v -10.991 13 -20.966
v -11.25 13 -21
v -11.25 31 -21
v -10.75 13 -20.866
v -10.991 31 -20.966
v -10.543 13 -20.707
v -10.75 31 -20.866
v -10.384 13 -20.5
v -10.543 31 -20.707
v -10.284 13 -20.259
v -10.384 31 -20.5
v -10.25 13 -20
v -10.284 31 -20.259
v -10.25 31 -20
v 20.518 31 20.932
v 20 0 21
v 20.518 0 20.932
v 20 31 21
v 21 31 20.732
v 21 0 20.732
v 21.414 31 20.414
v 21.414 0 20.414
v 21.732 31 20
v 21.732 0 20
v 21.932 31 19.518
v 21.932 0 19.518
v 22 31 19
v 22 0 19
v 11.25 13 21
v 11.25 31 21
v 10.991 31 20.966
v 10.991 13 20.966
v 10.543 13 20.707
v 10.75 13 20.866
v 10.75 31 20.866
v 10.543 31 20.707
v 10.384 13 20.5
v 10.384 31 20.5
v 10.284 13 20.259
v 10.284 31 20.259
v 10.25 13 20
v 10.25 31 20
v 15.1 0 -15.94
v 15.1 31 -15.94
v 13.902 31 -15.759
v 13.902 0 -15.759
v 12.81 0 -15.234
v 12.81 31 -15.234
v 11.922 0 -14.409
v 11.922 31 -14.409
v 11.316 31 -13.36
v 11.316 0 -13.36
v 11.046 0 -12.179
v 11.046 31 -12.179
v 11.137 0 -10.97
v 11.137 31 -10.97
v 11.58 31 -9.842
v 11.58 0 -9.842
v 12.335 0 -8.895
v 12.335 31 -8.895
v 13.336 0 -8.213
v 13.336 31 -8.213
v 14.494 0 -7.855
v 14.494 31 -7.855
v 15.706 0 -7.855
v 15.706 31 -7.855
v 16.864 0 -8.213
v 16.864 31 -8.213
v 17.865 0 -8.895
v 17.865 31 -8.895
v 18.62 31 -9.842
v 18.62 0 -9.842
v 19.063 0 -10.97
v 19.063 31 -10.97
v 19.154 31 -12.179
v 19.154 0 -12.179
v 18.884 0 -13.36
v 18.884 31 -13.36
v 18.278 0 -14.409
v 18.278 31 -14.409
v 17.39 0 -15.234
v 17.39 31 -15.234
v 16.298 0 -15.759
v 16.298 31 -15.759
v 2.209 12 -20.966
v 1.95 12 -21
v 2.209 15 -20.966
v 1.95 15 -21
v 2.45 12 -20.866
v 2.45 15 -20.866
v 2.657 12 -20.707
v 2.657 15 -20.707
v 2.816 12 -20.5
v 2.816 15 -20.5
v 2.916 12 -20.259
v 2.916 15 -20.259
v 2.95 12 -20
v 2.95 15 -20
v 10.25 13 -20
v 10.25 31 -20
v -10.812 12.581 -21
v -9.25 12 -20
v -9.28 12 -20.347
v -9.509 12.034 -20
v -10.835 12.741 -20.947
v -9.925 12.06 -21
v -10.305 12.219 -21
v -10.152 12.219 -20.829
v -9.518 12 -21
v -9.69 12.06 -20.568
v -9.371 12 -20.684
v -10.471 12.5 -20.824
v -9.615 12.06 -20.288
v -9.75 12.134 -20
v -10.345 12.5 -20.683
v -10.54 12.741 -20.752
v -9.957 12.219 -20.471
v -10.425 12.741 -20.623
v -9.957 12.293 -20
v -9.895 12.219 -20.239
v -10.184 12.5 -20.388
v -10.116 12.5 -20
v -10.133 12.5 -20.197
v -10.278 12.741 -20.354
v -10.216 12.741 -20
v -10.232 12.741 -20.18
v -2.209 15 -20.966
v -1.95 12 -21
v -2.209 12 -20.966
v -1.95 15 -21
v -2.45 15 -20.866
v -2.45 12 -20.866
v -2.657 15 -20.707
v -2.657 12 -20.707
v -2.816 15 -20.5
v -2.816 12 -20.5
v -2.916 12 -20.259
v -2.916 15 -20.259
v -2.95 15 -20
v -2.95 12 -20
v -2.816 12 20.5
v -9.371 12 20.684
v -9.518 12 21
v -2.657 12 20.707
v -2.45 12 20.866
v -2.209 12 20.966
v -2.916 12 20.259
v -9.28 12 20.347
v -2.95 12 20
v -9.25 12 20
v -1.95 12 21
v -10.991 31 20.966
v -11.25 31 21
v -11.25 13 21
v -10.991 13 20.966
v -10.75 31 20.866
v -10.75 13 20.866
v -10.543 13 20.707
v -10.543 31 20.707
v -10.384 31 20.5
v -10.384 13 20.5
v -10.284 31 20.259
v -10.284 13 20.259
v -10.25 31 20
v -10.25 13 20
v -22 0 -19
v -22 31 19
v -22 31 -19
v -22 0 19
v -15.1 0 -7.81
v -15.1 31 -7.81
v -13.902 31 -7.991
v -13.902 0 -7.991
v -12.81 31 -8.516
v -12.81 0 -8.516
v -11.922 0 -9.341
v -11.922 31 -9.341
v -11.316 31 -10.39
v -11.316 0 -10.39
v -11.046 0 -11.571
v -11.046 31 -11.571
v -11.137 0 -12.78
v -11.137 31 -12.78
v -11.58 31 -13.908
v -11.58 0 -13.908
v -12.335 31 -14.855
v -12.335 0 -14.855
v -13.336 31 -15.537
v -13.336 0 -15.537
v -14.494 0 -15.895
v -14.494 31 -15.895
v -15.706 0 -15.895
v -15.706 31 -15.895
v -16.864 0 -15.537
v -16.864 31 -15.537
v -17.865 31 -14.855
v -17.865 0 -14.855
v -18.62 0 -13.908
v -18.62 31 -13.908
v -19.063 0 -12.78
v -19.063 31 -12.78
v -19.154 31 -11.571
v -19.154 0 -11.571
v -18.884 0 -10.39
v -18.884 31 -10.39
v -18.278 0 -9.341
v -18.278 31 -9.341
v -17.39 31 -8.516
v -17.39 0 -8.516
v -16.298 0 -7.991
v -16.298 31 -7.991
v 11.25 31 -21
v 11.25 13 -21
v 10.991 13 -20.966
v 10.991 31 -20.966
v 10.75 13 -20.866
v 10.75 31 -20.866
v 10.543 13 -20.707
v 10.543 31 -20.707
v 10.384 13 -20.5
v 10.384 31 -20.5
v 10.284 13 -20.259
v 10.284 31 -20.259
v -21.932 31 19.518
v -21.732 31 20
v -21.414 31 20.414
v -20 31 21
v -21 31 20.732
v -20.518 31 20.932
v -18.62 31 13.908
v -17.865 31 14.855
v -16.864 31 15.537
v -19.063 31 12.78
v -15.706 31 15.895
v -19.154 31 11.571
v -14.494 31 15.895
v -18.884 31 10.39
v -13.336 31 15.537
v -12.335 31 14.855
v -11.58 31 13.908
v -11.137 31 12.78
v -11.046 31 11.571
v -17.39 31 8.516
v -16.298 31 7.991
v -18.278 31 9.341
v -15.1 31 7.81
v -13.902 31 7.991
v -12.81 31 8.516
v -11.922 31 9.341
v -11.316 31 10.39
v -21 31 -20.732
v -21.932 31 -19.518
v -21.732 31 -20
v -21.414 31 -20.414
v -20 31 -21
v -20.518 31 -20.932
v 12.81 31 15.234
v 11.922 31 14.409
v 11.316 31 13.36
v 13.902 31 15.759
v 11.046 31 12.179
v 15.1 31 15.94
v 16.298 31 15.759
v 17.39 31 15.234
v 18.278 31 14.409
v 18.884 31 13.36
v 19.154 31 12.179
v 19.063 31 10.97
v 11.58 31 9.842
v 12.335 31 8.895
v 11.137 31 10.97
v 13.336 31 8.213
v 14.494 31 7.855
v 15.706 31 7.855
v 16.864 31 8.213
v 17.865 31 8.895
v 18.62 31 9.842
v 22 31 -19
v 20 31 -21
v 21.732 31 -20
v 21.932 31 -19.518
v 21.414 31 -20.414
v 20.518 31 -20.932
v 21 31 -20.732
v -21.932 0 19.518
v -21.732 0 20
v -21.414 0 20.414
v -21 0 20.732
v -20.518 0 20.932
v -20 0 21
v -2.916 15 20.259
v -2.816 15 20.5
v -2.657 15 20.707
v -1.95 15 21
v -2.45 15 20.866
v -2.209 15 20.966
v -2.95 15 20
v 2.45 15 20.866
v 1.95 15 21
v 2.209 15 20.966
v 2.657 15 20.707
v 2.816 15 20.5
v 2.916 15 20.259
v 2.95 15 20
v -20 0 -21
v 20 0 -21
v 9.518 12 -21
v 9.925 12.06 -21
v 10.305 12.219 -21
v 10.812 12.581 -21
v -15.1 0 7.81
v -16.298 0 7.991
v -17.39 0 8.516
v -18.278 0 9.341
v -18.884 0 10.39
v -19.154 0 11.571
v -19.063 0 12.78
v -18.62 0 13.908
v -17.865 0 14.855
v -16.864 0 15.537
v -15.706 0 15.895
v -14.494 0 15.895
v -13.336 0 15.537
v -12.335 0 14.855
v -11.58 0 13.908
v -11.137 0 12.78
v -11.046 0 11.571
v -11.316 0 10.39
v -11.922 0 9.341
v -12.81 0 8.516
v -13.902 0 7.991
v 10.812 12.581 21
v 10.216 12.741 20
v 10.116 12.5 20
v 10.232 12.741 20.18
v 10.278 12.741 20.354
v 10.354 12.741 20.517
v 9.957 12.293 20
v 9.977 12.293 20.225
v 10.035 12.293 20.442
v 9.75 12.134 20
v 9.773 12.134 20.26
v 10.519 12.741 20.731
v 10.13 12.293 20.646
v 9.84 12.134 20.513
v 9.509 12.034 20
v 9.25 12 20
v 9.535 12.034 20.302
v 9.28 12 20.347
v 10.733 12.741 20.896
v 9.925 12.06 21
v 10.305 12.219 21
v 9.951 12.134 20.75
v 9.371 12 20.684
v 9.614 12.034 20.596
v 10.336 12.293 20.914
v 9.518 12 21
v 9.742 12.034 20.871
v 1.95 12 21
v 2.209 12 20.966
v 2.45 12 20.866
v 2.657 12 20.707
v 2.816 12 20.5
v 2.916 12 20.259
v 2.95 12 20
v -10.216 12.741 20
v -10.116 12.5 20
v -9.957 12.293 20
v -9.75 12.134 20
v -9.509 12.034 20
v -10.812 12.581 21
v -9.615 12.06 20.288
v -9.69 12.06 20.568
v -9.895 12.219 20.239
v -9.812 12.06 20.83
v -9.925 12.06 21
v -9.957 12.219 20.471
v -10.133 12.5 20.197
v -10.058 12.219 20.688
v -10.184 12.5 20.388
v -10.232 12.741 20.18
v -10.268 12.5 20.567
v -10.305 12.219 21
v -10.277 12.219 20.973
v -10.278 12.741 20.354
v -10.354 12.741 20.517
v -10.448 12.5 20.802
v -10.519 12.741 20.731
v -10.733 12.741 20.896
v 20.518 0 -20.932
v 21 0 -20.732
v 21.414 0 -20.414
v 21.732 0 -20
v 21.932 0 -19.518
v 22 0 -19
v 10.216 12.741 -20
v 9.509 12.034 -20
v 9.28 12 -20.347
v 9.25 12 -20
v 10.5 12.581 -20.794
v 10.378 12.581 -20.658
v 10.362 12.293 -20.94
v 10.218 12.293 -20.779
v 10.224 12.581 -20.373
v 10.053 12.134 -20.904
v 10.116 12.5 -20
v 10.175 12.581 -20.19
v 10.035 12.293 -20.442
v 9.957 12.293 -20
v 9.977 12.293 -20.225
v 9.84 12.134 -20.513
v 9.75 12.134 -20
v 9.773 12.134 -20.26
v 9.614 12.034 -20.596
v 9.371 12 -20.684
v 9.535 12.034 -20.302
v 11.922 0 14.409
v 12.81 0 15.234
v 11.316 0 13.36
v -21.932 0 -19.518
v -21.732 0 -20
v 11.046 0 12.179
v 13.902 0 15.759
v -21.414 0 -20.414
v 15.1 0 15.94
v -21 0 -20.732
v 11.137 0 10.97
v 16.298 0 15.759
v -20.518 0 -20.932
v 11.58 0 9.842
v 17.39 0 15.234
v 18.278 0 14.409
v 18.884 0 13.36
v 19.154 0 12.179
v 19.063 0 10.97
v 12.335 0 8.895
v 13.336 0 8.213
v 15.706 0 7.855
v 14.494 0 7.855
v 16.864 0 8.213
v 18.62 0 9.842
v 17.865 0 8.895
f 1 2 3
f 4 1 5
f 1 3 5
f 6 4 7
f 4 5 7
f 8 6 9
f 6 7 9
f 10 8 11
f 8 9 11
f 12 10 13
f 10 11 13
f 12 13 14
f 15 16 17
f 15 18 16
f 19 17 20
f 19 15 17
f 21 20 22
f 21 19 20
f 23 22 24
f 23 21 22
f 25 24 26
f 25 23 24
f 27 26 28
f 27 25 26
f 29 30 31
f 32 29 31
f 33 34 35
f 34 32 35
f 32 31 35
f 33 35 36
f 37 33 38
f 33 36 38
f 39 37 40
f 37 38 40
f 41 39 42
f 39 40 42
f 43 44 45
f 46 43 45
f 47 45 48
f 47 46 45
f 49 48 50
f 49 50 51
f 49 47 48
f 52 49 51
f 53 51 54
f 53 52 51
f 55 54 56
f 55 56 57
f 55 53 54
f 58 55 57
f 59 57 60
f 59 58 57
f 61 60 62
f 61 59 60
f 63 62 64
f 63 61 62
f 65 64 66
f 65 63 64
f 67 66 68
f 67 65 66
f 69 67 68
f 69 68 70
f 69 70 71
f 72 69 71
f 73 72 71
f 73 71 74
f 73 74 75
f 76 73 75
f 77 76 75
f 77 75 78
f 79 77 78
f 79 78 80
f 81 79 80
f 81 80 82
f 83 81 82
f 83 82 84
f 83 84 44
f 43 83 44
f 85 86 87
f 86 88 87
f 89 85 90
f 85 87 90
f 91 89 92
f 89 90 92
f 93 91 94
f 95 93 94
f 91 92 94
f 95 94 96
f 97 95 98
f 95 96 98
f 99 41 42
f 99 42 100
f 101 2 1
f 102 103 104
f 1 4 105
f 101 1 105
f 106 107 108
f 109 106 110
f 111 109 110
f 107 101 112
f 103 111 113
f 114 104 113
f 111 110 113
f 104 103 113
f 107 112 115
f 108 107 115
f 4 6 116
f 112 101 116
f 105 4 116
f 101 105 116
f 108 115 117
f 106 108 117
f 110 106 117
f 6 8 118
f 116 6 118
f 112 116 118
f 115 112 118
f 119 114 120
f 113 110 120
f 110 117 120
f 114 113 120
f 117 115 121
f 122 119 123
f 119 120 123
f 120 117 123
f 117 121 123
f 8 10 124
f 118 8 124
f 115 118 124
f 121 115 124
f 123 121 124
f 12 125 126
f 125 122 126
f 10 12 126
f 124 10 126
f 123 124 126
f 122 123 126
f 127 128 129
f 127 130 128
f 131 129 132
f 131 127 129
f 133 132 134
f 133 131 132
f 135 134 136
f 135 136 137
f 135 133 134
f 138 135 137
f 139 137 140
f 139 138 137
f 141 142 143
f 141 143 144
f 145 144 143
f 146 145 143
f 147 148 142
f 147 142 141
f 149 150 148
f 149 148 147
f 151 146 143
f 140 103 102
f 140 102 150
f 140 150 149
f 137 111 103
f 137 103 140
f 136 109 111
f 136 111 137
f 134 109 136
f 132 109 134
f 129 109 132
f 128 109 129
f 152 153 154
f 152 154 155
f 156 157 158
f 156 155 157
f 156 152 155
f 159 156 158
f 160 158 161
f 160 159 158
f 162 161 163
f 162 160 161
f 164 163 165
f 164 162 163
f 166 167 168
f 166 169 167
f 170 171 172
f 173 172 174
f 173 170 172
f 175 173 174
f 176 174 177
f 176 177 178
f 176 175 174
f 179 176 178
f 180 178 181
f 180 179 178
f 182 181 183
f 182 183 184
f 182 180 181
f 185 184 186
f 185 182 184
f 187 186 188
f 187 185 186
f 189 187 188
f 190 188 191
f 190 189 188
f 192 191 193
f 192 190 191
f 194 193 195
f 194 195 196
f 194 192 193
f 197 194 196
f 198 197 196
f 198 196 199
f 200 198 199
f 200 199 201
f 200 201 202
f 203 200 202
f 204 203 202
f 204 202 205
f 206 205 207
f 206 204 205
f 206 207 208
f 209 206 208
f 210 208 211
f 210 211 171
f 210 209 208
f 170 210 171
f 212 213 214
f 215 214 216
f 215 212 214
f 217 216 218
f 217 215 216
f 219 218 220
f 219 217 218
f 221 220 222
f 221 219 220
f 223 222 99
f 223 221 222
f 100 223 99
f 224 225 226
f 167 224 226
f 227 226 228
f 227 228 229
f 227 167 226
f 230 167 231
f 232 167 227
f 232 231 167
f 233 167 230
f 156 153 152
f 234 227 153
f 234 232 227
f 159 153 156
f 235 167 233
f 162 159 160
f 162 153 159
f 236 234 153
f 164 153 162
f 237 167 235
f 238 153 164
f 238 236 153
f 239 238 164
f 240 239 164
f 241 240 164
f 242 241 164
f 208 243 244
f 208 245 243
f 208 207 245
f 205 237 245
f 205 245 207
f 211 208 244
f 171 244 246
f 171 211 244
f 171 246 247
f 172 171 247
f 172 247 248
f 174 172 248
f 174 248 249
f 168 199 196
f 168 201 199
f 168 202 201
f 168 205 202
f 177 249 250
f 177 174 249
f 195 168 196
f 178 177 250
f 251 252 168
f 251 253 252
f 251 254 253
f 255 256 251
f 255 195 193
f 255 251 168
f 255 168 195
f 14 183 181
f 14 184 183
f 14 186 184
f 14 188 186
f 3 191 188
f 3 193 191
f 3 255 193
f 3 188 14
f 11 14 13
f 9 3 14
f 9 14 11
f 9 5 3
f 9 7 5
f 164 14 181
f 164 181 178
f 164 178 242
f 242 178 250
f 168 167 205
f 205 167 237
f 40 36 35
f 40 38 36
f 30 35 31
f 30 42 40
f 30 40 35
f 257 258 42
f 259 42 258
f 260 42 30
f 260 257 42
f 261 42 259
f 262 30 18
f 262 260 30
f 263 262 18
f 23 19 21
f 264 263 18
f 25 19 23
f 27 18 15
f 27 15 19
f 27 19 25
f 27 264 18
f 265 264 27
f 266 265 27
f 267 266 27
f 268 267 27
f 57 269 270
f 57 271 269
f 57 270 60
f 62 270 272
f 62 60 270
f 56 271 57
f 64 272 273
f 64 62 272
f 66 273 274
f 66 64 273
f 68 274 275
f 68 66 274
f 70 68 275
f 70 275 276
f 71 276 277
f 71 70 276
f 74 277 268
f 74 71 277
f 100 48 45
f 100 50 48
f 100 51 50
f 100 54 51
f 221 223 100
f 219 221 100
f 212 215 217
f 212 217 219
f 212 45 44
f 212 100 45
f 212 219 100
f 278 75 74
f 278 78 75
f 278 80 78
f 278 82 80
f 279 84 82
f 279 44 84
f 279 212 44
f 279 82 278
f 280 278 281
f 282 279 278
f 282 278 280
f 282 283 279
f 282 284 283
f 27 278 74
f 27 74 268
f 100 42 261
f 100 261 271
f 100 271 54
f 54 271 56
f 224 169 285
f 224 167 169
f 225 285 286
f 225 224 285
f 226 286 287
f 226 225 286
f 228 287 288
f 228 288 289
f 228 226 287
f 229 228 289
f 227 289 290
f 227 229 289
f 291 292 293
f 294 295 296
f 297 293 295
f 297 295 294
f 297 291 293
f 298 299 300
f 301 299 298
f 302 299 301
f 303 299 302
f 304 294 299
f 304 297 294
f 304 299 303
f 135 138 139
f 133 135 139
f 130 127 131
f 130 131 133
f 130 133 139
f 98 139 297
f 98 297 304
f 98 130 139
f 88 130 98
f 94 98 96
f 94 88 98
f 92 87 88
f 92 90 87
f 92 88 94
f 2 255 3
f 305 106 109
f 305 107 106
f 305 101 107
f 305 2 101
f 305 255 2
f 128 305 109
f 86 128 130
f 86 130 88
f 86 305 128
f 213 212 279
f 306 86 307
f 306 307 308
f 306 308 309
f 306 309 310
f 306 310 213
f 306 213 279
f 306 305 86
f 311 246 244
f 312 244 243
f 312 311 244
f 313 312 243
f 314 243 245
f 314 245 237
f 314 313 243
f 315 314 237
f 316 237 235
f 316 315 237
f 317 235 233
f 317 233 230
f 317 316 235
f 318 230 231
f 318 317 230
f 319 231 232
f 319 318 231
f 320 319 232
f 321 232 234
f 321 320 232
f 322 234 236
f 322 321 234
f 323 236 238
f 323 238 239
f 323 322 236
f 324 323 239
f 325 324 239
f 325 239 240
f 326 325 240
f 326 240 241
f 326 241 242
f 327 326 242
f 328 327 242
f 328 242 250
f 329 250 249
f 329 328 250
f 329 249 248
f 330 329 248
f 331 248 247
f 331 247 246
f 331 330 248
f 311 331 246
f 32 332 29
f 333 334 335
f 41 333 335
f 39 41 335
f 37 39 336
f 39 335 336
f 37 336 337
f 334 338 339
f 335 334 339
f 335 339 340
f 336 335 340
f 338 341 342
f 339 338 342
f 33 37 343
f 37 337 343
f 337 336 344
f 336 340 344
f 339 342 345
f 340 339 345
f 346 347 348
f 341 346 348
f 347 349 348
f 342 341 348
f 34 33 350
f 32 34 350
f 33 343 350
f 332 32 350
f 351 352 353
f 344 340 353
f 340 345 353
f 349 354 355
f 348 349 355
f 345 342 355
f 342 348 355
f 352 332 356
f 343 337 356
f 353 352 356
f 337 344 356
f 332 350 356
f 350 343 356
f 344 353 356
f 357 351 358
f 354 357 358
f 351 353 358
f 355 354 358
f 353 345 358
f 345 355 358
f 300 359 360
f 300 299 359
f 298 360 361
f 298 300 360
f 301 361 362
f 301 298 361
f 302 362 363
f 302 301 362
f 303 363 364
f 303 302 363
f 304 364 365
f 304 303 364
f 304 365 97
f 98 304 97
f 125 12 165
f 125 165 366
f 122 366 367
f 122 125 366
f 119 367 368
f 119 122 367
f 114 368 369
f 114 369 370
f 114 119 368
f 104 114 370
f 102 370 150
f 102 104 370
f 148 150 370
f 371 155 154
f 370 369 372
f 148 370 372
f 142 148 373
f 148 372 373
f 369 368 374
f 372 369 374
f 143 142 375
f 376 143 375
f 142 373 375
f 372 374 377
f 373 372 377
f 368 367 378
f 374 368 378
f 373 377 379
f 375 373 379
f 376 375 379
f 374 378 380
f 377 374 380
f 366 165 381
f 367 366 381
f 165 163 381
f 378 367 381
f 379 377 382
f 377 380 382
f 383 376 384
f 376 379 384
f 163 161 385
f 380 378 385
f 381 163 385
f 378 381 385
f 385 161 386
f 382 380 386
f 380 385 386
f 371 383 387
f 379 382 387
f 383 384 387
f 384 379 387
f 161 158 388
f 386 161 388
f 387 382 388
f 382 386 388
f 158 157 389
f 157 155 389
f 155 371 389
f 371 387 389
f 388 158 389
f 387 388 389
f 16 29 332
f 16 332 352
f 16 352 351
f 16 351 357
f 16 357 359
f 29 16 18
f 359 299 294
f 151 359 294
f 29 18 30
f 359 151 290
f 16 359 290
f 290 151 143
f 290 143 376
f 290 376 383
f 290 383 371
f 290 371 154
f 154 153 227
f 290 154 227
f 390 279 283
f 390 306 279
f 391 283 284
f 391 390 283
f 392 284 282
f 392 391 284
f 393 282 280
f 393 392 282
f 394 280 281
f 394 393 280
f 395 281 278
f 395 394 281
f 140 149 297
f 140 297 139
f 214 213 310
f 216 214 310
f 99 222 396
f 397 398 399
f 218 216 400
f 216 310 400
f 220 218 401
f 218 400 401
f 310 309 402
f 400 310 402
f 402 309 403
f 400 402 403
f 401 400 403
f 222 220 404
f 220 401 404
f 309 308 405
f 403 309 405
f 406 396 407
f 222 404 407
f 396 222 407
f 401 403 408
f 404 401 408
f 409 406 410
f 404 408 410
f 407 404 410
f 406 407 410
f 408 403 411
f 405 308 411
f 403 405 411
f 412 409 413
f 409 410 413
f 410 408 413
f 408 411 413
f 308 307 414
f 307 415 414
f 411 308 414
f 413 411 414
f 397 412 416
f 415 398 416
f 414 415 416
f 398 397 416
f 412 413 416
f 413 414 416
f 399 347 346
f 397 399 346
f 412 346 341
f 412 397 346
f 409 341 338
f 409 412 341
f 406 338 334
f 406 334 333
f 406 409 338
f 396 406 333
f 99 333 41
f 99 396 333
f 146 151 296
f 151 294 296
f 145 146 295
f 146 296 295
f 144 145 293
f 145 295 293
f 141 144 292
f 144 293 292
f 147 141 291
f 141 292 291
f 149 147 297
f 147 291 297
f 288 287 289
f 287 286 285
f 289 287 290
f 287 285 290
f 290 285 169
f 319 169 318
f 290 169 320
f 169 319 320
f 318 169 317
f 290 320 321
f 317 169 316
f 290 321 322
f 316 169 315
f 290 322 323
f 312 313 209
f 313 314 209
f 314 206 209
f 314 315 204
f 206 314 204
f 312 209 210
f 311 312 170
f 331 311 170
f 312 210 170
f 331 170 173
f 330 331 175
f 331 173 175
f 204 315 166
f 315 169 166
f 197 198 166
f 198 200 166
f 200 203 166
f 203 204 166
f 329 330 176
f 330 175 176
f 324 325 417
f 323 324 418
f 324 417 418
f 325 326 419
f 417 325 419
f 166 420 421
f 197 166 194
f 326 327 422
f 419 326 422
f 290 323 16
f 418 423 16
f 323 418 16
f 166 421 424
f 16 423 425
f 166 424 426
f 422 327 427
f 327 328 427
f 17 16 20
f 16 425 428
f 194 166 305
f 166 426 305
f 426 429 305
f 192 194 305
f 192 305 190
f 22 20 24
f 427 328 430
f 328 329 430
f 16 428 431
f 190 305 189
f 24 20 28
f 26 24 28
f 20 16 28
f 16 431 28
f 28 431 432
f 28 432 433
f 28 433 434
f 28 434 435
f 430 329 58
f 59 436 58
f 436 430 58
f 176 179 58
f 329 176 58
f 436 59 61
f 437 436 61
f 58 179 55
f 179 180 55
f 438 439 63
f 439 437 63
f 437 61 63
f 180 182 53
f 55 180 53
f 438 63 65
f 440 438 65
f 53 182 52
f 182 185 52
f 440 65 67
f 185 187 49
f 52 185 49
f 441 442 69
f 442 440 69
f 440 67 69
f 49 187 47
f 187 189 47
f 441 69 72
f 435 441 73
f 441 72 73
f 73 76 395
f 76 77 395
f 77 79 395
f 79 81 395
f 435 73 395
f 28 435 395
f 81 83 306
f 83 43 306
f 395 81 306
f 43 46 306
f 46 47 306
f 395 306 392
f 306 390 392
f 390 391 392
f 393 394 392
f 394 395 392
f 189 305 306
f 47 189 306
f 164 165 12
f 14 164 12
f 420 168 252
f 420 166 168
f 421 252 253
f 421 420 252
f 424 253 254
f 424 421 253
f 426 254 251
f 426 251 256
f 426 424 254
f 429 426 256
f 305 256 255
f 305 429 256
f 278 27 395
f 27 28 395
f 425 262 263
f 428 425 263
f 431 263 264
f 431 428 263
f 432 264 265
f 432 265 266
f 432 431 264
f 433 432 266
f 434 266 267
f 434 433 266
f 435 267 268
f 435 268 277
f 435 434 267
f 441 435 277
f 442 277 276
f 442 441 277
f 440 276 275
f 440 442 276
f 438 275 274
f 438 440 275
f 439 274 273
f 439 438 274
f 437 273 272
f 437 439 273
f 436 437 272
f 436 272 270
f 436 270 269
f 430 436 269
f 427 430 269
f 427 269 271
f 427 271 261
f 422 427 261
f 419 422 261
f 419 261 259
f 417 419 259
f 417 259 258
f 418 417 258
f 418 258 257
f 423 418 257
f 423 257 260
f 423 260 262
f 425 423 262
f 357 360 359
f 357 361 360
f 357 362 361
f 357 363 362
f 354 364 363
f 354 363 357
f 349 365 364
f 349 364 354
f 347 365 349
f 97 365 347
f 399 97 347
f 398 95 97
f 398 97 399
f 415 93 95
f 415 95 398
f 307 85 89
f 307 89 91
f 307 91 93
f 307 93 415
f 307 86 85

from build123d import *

# Parameters (mm, degrees)
ESQUISSE1_W             = 44
ESQUISSE1_H             = 42
ESQUISSE1_R             = 4.065
BOSS_EXTRU_1_DEPTH      = 12
ESQUISSE2_W             = 5.9
ESQUISSE2_H             = 42
ESQUISSE2_W_2           = 11.75
ESQUISSE2_R             = 4.065
BOSS_EXTRU_2_DEPTH      = 19
ESQUISSE3_W             = 5.9
ESQUISSE3_H             = 42
ENL_V_MAT_EXTRU_1_DEPTH = 16
CONG_1_R                = 2
CONG_2_R                = 1
CONG_3_R                = 1


with BuildPart() as part:
    # Esquisse1 → Boss.-Extru.1 (new body)
    with BuildSketch(Plane(origin=(0, 0, 0), x_dir=(1, 0, 0), z_dir=(0, 1, 0))):
        Rectangle(ESQUISSE1_W, ESQUISSE1_H)
        with Locations(Location((-15.1, 11.875, 0), (0, 0, 270))):
            Circle(ESQUISSE1_R, mode=Mode.SUBTRACT)
        with Locations(Location((15.1, 11.875, 0), (0, 0, 90))):
            Circle(ESQUISSE1_R, mode=Mode.SUBTRACT)
        with Locations(Location((15.1, -11.875, 0), (0, 0, 270))):
            Circle(ESQUISSE1_R, mode=Mode.SUBTRACT)
        with Locations(Location((-15.1, -11.875, 0), (0, 0, 90))):
            Circle(ESQUISSE1_R, mode=Mode.SUBTRACT)
    extrude(amount=BOSS_EXTRU_1_DEPTH)

    # Esquisse2 → Boss.-Extru.2 (add)
    # profile 1 of 3: a face of its own
    with BuildSketch(Plane(origin=(0, 12, 0), x_dir=(1, 0, 0), z_dir=(0, 1, 0))):
        Rectangle(ESQUISSE2_W, ESQUISSE2_H)
    # profile 2 of 3: a face of its own
    with BuildSketch(Plane(origin=(0, 12, 0), x_dir=(1, 0, 0), z_dir=(0, 1, 0))):
        with Locations((-16.125, 0)):
            Rectangle(ESQUISSE2_W_2, ESQUISSE2_H)
        with Locations(Location((-15.1, -11.875, 0), (0, 0, 90))):
            Circle(ESQUISSE2_R, mode=Mode.SUBTRACT)
        with Locations(Location((-15.1, 11.875, 0), (0, 0, 270))):
            Circle(ESQUISSE2_R, mode=Mode.SUBTRACT)
    # profile 3 of 3: a face of its own
    with BuildSketch(Plane(origin=(0, 12, 0), x_dir=(1, 0, 0), z_dir=(0, 1, 0))):
        with Locations((16.125, 0)):
            Rectangle(ESQUISSE2_W_2, ESQUISSE2_H)
        with Locations(Location((15.1, 11.875, 0), (0, 0, 90))):
            Circle(ESQUISSE2_R, mode=Mode.SUBTRACT)
        with Locations(Location((15.1, -11.875, 0), (0, 0, 270))):
            Circle(ESQUISSE2_R, mode=Mode.SUBTRACT)
    extrude(amount=BOSS_EXTRU_2_DEPTH)

    # Esquisse3 → Enlèv. mat.-Extru.1 (cut)
    with BuildSketch(Plane(origin=(0, 31, 0), x_dir=(1, 0, 0), z_dir=(0, 1, 0))):
        Rectangle(ESQUISSE3_W, ESQUISSE3_H)
    extrude(amount=-ENL_V_MAT_EXTRU_1_DEPTH, mode=Mode.SUBTRACT)

    # Congé1
    cong_1_edges = [part.edges().sort_by_distance(p)[0] for p in [
        (-22, 15.5, -21),
        (22, 15.5, -21),
        (22, 15.5, 21),
        (-22, 15.5, 21),
    ]]
    fillet(cong_1_edges, radius=CONG_1_R)

    # Congé2
    cong_2_edges = [part.edges().sort_by_distance(p)[0] for p in [
        (-10.25, 21.5, 21),
        (-10.25, 21.5, -21),
        (10.25, 21.5, -21),
        (10.25, 21.5, 21),
        (-2.95, 13.5, 21),
        (-2.95, 13.5, -21),
        (2.95, 13.5, -21),
        (2.95, 13.5, 21),
    ]]
    fillet(cong_2_edges, radius=CONG_2_R)

    # Congé3
    # the kernel refuses this fillet: 1 mm, written as the material it adds along each edge
    with BuildSketch(Plane(origin=(10.25, 12, -20), x_dir=(0, 1, 0), z_dir=(0, 0, 1))) as cong_3_piece_1:
        with BuildLine():
            CenterArc((CONG_3_R, CONG_3_R), CONG_3_R, 180, 90)
            Line((0, CONG_3_R), (0, 0))
            Line((0, 0), (CONG_3_R, 0))
        make_face()
    extrude(amount=40)
    with BuildSketch(Plane(origin=(-10.25, 12, -20), x_dir=(0, 1, 0), z_dir=(0, 0, 1))) as cong_3_piece_2:
        with BuildLine():
            CenterArc((CONG_3_R, -CONG_3_R), CONG_3_R, 90, 90)
            Line((0, -CONG_3_R), (0, 0))
            Line((0, 0), (CONG_3_R, 0))
        make_face()
    extrude(amount=40)
    with BuildSketch(Plane(origin=(11.25, 12, -20), x_dir=(0.5976672776328271, 0, 0.8017442392976486), z_dir=(-0.8017442392976486, 0, 0.5976672776328271))) as cong_3_piece_3_section:
        with BuildLine():
            CenterArc((1 + CONG_3_R, CONG_3_R), CONG_3_R, 180, 90)
            Line((1, CONG_3_R), (1, 0))
            Line((1, 0), (1 + CONG_3_R, 0))
        make_face()
    cong_3_piece_3 = revolve(axis=Axis((11.25, 12, -20), (0, 1, 0)), revolution_arc=233.296989237, mode=Mode.PRIVATE)
    cong_3_piece_3 = split(cong_3_piece_3, bisect_by=Plane(origin=(10.500061043, 12.311628317, -21), z_dir=(0, 0, 1)), keep=Keep.TOP, mode=Mode.PRIVATE)
    add(cong_3_piece_3)
    with BuildSketch(Plane(origin=(11.25, 12, 20), x_dir=(-1, 0, 0), z_dir=(0, 0, -1))) as cong_3_piece_4_section:
        with BuildLine():
            CenterArc((1 + CONG_3_R, CONG_3_R), CONG_3_R, 180, 90)
            Line((1 + CONG_3_R, 0), (1, 0))
            Line((1, 0), (1, CONG_3_R))
        make_face()
    cong_3_piece_4 = revolve(axis=Axis((11.25, 12, 20), (0, 1, 0)), revolution_arc=233.296989237, mode=Mode.PRIVATE)
    cong_3_piece_4 = split(cong_3_piece_4, bisect_by=Plane(origin=(10.500061142, 12.311628426, 21), z_dir=(0, 0, -1)), keep=Keep.TOP, mode=Mode.PRIVATE)
    add(cong_3_piece_4)
    with BuildSketch(Plane(origin=(-11.25, 12, -20), x_dir=(-0.5976672776328282, 0, 0.8017442392976477), z_dir=(0.8017442392976477, 0, 0.5976672776328282))) as cong_3_piece_5_section:
        with BuildLine():
            CenterArc((1 + CONG_3_R, -CONG_3_R), CONG_3_R, 90, 90)
            Line((1 + CONG_3_R, 0), (1, 0))
            Line((1, 0), (1, -CONG_3_R))
        make_face()
    cong_3_piece_5 = revolve(axis=Axis((-11.25, 12, -20), (0, -1, 0)), revolution_arc=233.296989237, mode=Mode.PRIVATE)
    cong_3_piece_5 = split(cong_3_piece_5, bisect_by=Plane(origin=(-10.500061216, 12.311628717, -21), z_dir=(0, 0, 1)), keep=Keep.TOP, mode=Mode.PRIVATE)
    add(cong_3_piece_5)
    with BuildSketch(Plane(origin=(-11.25, 12, 20), x_dir=(1, 0, 0), z_dir=(0, 0, -1))) as cong_3_piece_6_section:
        with BuildLine():
            CenterArc((1 + CONG_3_R, -CONG_3_R), CONG_3_R, 90, 90)
            Line((1 + CONG_3_R, 0), (1, 0))
            Line((1, 0), (1, -CONG_3_R))
        make_face()
    cong_3_piece_6 = revolve(axis=Axis((-11.25, 12, 20), (0, -1, 0)), revolution_arc=233.296989237, mode=Mode.PRIVATE)
    cong_3_piece_6 = split(cong_3_piece_6, bisect_by=Plane(origin=(-10.500060984, 12.311628017, 21), z_dir=(0, 0, -1)), keep=Keep.TOP, mode=Mode.PRIVATE)
    add(cong_3_piece_6)


solid = part.part
